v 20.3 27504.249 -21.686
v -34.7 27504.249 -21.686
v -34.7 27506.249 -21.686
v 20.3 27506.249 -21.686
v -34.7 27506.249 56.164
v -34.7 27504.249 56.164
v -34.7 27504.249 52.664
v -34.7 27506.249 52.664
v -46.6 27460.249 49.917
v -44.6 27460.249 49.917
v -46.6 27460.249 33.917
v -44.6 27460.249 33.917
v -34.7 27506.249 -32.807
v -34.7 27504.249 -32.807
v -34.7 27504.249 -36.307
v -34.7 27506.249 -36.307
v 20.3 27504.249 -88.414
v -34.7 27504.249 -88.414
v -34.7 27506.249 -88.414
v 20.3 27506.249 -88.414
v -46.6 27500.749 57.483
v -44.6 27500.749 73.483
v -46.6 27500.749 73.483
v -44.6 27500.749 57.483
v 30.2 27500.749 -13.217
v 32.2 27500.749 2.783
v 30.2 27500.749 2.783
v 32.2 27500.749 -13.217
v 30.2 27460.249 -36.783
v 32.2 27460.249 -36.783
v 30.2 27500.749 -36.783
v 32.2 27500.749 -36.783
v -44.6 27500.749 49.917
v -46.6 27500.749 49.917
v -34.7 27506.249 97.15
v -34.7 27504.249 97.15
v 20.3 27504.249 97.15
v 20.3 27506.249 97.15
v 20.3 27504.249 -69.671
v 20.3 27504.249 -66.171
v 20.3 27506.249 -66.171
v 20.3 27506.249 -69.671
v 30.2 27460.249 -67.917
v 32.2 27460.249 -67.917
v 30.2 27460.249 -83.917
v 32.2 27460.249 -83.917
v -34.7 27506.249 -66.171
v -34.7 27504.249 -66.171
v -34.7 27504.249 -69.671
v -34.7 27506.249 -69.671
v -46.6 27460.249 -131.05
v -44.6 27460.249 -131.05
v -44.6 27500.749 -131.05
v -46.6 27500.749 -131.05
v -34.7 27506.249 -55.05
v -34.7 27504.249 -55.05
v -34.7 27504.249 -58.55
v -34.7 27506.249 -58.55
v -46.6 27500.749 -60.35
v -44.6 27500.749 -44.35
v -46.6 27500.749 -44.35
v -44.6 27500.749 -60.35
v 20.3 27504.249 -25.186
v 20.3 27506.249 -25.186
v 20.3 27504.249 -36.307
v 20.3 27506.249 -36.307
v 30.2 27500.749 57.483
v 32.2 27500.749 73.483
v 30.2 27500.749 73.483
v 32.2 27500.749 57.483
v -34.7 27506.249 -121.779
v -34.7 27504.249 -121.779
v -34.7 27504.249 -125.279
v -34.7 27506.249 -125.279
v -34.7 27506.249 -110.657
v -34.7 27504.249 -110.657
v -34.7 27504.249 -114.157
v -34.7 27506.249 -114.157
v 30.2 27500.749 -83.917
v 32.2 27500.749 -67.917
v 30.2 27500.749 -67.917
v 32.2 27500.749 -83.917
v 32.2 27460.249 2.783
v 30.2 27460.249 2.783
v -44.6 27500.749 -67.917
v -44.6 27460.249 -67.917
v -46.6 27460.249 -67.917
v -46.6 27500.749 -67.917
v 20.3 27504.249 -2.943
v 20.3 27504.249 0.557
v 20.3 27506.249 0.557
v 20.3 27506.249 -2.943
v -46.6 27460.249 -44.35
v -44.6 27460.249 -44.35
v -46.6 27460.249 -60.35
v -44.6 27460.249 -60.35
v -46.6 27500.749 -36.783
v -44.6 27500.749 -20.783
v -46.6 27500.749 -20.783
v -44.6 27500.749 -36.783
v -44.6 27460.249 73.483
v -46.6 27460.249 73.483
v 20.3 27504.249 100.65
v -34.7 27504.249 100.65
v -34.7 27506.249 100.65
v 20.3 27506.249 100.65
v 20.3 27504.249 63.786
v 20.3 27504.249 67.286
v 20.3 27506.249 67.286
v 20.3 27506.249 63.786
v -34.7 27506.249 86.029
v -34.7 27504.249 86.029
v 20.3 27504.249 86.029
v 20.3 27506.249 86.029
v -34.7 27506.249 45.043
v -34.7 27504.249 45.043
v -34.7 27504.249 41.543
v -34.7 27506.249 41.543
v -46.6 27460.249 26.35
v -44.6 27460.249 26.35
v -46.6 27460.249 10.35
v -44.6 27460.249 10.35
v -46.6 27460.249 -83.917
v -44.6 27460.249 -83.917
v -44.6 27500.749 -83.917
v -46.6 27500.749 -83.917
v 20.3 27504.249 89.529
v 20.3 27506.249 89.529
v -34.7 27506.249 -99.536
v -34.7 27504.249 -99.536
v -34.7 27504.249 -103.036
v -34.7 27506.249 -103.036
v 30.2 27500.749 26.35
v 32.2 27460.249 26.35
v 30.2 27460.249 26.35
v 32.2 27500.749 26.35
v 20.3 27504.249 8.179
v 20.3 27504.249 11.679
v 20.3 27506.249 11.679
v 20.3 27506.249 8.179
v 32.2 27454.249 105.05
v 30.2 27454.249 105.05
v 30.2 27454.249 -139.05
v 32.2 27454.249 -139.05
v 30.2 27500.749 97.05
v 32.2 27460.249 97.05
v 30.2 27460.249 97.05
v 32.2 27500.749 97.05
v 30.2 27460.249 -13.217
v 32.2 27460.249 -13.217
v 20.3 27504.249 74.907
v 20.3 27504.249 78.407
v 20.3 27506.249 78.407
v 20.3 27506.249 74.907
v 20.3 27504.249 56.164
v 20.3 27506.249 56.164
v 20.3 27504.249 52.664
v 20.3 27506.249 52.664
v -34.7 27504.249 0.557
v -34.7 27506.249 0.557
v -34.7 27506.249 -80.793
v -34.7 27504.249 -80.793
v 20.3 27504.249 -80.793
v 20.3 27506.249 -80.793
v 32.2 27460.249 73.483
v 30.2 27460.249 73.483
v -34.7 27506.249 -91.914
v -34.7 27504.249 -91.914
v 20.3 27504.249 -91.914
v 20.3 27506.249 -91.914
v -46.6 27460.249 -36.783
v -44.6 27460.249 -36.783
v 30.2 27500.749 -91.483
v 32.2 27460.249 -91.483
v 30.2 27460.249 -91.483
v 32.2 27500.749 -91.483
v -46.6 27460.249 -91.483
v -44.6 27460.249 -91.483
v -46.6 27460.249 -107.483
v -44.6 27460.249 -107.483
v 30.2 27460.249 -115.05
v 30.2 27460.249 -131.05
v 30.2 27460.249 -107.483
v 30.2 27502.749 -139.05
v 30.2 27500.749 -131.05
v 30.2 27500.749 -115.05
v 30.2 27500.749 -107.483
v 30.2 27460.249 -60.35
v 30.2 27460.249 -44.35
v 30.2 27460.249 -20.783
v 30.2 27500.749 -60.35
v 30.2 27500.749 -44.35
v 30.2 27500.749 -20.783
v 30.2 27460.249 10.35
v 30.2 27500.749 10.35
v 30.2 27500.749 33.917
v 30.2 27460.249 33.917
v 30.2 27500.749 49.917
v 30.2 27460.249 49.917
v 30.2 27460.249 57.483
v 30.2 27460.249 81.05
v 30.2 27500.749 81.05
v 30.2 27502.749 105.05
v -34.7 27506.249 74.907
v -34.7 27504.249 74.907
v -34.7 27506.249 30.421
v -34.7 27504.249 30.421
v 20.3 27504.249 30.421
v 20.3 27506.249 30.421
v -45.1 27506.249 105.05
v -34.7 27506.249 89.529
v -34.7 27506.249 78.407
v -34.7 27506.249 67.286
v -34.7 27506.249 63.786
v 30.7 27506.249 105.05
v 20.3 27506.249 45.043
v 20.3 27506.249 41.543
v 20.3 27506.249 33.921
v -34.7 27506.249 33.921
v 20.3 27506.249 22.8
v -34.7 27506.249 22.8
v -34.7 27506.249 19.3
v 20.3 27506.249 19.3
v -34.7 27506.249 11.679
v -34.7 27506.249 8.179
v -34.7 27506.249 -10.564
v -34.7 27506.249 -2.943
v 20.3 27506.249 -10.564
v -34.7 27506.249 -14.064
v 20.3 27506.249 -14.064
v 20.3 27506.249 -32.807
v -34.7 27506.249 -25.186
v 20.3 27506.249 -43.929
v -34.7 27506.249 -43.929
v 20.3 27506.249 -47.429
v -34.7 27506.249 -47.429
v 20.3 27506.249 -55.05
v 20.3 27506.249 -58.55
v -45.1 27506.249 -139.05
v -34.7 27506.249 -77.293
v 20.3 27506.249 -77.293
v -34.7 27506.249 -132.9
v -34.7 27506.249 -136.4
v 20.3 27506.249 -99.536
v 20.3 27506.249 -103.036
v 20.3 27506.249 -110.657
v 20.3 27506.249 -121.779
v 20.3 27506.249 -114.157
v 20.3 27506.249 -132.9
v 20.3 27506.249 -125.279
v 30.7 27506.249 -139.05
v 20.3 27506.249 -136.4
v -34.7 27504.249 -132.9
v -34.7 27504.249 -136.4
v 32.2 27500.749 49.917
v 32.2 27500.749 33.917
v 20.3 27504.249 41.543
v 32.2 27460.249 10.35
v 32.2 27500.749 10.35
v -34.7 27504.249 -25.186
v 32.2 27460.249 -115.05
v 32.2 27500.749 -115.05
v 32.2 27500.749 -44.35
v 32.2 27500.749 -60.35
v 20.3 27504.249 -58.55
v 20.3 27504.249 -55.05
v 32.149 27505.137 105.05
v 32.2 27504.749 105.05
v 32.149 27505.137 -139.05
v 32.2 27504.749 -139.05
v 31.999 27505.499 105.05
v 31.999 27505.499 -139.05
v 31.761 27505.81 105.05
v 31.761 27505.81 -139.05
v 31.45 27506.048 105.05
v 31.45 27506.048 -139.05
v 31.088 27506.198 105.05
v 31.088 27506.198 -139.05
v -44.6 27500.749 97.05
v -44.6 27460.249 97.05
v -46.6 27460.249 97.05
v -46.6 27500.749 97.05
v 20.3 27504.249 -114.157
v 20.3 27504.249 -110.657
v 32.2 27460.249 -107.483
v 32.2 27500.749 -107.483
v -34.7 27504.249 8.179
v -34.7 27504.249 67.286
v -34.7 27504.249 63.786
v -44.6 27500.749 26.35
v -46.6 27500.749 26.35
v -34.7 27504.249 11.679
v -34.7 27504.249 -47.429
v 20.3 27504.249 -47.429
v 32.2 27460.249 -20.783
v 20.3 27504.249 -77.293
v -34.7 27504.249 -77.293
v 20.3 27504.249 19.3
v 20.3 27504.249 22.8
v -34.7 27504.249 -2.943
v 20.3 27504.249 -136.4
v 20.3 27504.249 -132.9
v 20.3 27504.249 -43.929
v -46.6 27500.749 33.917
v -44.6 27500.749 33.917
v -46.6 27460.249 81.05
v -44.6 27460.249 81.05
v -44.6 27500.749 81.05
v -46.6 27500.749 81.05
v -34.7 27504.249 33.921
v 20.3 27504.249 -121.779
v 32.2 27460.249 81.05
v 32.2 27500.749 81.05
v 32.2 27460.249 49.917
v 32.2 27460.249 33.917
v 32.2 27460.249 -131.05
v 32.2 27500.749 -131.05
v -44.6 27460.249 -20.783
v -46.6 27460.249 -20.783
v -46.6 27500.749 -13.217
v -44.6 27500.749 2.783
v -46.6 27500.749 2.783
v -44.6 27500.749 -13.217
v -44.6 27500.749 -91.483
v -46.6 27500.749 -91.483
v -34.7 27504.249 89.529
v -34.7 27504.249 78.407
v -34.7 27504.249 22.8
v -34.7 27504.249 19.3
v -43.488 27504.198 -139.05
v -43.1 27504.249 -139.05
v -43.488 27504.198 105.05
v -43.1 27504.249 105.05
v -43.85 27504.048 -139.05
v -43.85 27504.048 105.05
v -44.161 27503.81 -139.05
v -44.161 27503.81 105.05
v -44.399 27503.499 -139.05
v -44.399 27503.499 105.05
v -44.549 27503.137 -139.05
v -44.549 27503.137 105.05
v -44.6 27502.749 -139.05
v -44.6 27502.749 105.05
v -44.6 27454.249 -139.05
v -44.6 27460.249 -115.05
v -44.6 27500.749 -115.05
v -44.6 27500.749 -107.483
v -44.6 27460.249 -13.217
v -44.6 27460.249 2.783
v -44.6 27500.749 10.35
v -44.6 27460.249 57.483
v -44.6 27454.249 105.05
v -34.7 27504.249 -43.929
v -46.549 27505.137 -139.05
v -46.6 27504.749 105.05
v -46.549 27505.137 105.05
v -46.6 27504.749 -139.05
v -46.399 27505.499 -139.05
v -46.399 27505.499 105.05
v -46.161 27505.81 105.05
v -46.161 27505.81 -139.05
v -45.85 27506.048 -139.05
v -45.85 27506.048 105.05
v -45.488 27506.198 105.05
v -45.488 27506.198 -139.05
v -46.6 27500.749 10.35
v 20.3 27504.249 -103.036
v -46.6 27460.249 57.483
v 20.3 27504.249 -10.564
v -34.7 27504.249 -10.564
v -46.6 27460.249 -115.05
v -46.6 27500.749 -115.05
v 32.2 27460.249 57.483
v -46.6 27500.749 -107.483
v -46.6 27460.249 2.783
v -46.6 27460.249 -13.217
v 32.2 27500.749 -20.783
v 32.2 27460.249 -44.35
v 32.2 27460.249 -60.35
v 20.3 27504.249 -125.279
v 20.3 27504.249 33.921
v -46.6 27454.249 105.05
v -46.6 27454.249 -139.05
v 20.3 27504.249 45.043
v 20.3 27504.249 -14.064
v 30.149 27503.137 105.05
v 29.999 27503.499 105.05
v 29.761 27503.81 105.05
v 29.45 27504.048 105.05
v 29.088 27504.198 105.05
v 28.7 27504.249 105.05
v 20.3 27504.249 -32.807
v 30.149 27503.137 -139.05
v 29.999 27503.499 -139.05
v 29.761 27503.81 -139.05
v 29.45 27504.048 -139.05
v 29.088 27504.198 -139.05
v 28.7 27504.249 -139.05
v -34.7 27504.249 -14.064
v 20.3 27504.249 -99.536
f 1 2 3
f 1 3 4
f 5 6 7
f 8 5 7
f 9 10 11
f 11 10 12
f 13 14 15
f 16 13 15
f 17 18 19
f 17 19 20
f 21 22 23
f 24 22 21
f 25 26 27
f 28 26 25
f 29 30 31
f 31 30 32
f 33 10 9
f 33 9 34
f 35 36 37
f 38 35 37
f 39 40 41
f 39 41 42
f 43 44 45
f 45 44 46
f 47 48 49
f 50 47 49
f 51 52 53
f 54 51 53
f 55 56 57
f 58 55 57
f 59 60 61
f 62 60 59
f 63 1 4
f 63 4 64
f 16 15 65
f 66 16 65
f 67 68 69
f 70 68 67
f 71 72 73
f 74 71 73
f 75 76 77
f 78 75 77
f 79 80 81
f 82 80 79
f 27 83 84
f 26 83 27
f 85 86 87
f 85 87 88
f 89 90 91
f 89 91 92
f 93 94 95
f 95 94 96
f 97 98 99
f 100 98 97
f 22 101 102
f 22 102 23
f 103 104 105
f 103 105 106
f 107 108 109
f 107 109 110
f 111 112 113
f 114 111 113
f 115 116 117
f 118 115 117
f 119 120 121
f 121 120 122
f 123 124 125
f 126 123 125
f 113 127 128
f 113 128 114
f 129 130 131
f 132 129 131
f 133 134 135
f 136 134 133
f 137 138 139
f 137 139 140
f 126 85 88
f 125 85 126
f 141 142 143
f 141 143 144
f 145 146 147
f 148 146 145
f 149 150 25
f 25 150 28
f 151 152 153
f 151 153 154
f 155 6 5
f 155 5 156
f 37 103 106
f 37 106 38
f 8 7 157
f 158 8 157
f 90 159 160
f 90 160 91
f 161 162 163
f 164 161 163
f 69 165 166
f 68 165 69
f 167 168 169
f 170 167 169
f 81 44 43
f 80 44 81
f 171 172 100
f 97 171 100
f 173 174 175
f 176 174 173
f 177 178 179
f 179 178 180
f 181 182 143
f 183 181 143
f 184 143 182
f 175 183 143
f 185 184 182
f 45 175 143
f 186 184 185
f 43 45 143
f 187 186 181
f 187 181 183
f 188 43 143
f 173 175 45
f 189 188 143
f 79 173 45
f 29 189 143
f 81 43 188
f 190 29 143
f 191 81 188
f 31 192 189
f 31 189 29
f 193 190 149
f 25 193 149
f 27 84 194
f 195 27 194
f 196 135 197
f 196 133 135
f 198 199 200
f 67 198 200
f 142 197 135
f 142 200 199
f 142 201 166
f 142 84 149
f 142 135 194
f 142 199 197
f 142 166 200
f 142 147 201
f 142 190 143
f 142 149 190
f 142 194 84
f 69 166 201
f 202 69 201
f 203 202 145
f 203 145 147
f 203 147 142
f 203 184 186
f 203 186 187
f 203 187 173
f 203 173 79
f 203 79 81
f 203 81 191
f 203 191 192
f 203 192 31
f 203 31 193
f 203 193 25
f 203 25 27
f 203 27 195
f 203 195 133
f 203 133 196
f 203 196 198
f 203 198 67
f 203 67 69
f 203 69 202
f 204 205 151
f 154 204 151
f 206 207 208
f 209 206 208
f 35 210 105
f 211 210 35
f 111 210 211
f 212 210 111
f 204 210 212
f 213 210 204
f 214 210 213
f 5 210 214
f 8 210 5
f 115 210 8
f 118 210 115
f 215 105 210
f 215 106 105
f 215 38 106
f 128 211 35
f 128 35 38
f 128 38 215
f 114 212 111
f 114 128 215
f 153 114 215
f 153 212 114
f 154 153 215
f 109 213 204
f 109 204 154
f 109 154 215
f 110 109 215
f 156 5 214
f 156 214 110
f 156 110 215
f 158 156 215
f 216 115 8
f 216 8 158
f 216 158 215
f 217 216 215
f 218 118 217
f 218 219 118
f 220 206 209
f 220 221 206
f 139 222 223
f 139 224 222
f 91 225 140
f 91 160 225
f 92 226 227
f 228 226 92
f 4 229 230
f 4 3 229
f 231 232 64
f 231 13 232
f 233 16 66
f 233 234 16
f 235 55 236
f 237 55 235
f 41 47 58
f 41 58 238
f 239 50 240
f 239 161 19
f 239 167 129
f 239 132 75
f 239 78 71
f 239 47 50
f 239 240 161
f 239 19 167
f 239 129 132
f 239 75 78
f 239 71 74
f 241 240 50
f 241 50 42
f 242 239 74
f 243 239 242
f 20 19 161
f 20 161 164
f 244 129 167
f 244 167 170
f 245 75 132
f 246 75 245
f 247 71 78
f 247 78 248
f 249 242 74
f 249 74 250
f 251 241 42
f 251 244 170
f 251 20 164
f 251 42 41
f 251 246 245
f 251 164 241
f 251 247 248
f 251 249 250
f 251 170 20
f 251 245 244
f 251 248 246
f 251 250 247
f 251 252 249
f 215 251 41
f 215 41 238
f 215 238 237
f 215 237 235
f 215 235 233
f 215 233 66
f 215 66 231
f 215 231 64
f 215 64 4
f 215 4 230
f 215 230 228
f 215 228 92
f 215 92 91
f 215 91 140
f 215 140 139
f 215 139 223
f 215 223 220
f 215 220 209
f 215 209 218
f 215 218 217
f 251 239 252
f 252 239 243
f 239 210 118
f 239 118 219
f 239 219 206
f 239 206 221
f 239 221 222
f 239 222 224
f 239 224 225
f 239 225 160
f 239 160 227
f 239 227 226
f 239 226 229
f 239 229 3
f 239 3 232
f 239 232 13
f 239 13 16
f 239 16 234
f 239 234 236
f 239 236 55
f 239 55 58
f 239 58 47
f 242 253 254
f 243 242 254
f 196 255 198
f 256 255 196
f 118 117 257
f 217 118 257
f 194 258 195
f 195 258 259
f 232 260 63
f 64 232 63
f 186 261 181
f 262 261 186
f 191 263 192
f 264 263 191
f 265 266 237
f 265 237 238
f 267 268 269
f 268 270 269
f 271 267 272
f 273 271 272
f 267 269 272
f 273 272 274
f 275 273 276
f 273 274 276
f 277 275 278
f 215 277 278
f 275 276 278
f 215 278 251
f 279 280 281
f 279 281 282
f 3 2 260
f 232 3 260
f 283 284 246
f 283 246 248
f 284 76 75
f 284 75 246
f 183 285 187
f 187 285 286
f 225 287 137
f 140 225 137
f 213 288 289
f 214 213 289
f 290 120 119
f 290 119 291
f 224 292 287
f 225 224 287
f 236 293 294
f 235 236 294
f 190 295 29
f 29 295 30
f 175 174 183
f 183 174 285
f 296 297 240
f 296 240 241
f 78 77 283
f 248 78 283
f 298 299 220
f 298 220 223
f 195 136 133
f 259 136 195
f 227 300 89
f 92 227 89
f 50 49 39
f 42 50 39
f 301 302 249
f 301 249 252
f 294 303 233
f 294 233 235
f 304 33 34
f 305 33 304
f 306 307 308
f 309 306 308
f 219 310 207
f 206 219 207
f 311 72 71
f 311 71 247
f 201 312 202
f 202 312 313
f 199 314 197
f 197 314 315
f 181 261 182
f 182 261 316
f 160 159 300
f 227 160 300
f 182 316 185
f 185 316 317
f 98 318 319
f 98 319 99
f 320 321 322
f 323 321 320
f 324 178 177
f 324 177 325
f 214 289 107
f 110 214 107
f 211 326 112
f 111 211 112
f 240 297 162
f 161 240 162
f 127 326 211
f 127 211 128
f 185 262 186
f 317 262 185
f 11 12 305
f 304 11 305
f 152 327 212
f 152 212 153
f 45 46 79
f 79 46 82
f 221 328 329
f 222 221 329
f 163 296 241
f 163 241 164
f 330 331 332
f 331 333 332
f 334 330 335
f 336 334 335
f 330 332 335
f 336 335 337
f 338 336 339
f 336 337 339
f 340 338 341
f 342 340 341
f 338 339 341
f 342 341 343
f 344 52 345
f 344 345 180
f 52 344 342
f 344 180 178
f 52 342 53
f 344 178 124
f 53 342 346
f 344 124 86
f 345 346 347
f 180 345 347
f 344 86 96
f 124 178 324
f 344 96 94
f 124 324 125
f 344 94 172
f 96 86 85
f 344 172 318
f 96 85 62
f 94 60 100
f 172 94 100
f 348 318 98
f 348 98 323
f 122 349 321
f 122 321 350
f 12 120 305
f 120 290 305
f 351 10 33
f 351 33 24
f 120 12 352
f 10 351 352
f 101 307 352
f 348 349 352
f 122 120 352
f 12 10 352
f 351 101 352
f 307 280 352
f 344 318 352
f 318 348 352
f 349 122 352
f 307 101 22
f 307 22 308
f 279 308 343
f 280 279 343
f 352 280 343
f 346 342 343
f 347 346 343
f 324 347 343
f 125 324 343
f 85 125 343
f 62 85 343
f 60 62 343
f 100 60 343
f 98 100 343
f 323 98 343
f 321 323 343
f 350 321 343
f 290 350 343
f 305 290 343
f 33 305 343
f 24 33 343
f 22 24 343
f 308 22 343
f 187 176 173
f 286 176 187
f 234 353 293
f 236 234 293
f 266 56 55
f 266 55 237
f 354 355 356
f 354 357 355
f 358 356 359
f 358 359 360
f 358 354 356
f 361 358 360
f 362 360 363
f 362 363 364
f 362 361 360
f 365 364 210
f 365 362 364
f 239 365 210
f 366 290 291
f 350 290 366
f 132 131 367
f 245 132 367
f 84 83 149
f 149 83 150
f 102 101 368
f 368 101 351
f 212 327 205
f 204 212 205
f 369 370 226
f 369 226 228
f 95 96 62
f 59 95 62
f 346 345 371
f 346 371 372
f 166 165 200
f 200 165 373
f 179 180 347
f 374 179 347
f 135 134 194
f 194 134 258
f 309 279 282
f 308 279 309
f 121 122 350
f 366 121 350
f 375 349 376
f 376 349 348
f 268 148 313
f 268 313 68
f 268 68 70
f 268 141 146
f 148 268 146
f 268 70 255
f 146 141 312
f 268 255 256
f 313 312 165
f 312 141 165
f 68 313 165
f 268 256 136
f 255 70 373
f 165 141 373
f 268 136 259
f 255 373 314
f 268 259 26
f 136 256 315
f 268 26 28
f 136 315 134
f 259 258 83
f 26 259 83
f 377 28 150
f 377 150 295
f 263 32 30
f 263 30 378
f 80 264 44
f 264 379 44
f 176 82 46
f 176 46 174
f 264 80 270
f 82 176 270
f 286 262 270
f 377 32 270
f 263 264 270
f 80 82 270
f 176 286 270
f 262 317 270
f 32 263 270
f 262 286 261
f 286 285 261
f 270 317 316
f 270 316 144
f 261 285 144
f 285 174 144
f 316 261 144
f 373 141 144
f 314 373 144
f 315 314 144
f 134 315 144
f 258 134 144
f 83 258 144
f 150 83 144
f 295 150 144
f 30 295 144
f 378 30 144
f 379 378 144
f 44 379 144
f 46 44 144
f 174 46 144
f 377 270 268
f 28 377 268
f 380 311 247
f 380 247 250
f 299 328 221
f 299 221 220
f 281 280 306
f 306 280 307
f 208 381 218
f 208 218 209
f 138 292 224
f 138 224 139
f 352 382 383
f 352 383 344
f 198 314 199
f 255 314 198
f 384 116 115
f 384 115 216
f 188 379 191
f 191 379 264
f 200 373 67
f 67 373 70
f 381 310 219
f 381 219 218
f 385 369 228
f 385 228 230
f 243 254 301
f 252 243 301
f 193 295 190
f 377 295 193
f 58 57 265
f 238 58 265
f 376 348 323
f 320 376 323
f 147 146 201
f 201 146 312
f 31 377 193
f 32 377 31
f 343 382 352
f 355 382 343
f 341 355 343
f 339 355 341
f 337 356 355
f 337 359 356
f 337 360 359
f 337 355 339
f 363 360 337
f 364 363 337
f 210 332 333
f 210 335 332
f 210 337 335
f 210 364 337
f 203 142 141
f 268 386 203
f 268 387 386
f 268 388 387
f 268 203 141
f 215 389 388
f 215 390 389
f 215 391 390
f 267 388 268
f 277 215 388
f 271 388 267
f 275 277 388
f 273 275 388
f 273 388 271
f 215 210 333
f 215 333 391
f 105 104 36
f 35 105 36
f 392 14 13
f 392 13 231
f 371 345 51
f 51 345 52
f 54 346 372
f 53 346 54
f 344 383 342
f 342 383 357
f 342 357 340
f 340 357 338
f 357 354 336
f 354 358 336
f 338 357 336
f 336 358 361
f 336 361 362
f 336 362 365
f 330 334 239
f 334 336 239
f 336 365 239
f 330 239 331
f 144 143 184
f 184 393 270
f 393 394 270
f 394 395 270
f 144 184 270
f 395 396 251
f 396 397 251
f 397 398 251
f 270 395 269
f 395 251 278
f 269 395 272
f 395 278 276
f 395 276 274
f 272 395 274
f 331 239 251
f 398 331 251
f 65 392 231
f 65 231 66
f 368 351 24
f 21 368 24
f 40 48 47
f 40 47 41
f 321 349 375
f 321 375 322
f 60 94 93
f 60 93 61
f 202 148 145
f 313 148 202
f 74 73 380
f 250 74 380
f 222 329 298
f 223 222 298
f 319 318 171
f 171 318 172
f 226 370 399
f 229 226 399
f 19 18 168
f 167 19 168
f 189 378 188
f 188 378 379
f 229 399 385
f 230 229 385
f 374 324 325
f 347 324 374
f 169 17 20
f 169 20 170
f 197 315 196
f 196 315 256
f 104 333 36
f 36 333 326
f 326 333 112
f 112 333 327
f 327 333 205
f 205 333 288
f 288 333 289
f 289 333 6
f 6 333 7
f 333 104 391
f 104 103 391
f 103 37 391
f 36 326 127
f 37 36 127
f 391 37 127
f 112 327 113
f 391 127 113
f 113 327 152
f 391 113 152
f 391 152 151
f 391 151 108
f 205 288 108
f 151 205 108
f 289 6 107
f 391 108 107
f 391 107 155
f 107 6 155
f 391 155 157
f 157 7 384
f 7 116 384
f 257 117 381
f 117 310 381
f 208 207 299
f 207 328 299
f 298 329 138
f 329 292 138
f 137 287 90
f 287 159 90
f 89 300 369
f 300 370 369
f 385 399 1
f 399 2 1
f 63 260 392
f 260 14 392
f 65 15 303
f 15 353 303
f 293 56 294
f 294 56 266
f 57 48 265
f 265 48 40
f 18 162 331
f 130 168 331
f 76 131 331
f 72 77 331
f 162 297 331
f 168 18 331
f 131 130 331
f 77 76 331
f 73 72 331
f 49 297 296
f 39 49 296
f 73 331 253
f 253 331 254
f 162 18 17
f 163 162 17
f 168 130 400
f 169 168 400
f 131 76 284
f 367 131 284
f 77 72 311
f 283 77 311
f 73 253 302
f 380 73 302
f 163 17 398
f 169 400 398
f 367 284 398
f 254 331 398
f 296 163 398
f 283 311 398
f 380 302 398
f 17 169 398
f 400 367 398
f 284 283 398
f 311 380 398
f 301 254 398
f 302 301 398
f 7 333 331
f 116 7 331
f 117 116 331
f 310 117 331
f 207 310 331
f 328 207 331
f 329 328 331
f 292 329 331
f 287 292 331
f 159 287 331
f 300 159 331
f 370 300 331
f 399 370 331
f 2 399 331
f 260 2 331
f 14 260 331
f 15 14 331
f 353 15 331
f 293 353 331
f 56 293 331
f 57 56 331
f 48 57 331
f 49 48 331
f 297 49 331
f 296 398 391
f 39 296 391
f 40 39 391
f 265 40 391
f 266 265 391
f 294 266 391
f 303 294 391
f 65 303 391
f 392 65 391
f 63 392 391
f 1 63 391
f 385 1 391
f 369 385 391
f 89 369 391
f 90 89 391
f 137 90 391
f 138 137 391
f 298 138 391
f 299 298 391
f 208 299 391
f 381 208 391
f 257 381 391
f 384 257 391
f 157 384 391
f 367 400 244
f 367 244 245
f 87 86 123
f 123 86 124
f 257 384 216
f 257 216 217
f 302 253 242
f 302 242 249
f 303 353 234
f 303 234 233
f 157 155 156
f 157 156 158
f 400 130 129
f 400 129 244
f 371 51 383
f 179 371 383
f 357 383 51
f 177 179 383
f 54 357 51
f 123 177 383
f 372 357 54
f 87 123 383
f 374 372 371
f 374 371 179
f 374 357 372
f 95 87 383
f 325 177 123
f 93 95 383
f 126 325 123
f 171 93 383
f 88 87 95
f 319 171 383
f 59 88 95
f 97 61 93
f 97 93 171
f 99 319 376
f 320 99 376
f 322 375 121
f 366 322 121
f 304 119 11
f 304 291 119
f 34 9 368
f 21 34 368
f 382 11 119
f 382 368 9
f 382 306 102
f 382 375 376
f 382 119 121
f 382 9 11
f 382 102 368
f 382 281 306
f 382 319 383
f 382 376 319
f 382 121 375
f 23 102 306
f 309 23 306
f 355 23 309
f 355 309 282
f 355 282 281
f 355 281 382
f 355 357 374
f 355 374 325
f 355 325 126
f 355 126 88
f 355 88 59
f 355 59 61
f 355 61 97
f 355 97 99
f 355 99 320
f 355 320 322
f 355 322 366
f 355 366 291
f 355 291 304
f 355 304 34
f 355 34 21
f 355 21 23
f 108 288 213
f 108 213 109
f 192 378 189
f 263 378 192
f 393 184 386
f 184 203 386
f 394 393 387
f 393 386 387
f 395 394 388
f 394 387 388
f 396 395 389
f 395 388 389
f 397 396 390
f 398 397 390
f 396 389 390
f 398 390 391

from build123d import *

# Parameters (mm, degrees)
SKETCH2_W           = 78.8
SKETCH2_H           = 244.1
SKETCH2_W_2         = 55
SKETCH2_H_2         = 3.5
BOSS_EXTRUDE1_DEPTH = 2
SKETCH3_W           = 2
SKETCH3_H           = 244.1
BOSS_EXTRUDE2_DEPTH = 50
FILLET1_R           = 1.5
SKETCH4_W           = 16
SKETCH4_H           = 40.5
CUT_EXTRUDE1_DEPTH  = 27507.713596192


with BuildPart() as part:
    # Sketch2 → Boss-Extrude1 (new body)
    with BuildSketch(Plane(origin=(0, 27504.249263039, 0), x_dir=(1, 0, 0), z_dir=(0, 1, 0))):
        with Locations((-7.2, 17)):
            Rectangle(SKETCH2_W, SKETCH2_H)
        with Locations((-7.2, 123.528571429)):
            Rectangle(SKETCH2_W_2, SKETCH2_H_2, mode=Mode.SUBTRACT)
        with Locations((-7.2, 134.65)):
            Rectangle(SKETCH2_W_2, SKETCH2_H_2, mode=Mode.SUBTRACT)
        with Locations((-7.2, 112.407142857)):
            Rectangle(SKETCH2_W_2, SKETCH2_H_2, mode=Mode.SUBTRACT)
        with Locations((-7.2, 101.285714286)):
            Rectangle(SKETCH2_W_2, SKETCH2_H_2, mode=Mode.SUBTRACT)
        with Locations((-7.2, 90.164285714)):
            Rectangle(SKETCH2_W_2, SKETCH2_H_2, mode=Mode.SUBTRACT)
        with Locations((-7.2, 79.042857143)):
            Rectangle(SKETCH2_W_2, SKETCH2_H_2, mode=Mode.SUBTRACT)
        with Locations((-7.2, 67.921428571)):
            Rectangle(SKETCH2_W_2, SKETCH2_H_2, mode=Mode.SUBTRACT)
        with Locations((-7.2, 56.8)):
            Rectangle(SKETCH2_W_2, SKETCH2_H_2, mode=Mode.SUBTRACT)
        with Locations((-7.2, 45.678571429)):
            Rectangle(SKETCH2_W_2, SKETCH2_H_2, mode=Mode.SUBTRACT)
        with Locations((-7.2, 34.557142857)):
            Rectangle(SKETCH2_W_2, SKETCH2_H_2, mode=Mode.SUBTRACT)
        with Locations((-7.2, 23.435714286)):
            Rectangle(SKETCH2_W_2, SKETCH2_H_2, mode=Mode.SUBTRACT)
        with Locations((-7.2, 12.314285714)):
            Rectangle(SKETCH2_W_2, SKETCH2_H_2, mode=Mode.SUBTRACT)
        with Locations((-7.2, 1.192857143)):
            Rectangle(SKETCH2_W_2, SKETCH2_H_2, mode=Mode.SUBTRACT)
        with Locations((-7.2, -9.928571429)):
            Rectangle(SKETCH2_W_2, SKETCH2_H_2, mode=Mode.SUBTRACT)
        with Locations((-7.2, -21.05)):
            Rectangle(SKETCH2_W_2, SKETCH2_H_2, mode=Mode.SUBTRACT)
        with Locations((-7.2, -32.171428571)):
            Rectangle(SKETCH2_W_2, SKETCH2_H_2, mode=Mode.SUBTRACT)
        with Locations((-7.2, -43.292857143)):
            Rectangle(SKETCH2_W_2, SKETCH2_H_2, mode=Mode.SUBTRACT)
        with Locations((-7.2, -54.414285714)):
            Rectangle(SKETCH2_W_2, SKETCH2_H_2, mode=Mode.SUBTRACT)
        with Locations((-7.2, -65.535714286)):
            Rectangle(SKETCH2_W_2, SKETCH2_H_2, mode=Mode.SUBTRACT)
        with Locations((-7.2, -76.657142857)):
            Rectangle(SKETCH2_W_2, SKETCH2_H_2, mode=Mode.SUBTRACT)
        with Locations((-7.2, -87.778571429)):
            Rectangle(SKETCH2_W_2, SKETCH2_H_2, mode=Mode.SUBTRACT)
        with Locations((-7.2, -98.9)):
            Rectangle(SKETCH2_W_2, SKETCH2_H_2, mode=Mode.SUBTRACT)
    extrude(amount=BOSS_EXTRUDE1_DEPTH)

    # Sketch3 → Boss-Extrude2 (add)
    with BuildSketch(Plane.XZ.offset(-27504.249263039)):
        with Locations((-45.6, -17)):
            Rectangle(SKETCH3_W, SKETCH3_H)
        with Locations((31.2, -17)):
            Rectangle(SKETCH3_W, SKETCH3_H)
    extrude(amount=BOSS_EXTRUDE2_DEPTH)

    # Fillet1
    fillet1_edges = [part.edges().sort_by_distance(p)[0] for p in [
        (32.2, 27506.249263039, -17),
        (-44.6, 27504.249263039, -17),
        (30.2, 27504.249263039, -17),
        (-46.6, 27506.249263039, -17),
    ]]
    fillet(fillet1_edges, radius=FILLET1_R)

    # Sketch4 → Cut-Extrude1 (cut, through all)
    with BuildSketch(Plane(origin=(32.2, 0, 0), x_dir=(0, 0, -1), z_dir=(1, 0, 0))):
        with Locations((-89.05, 27480.499263039)):
            Rectangle(SKETCH4_W, SKETCH4_H)
        with Locations((-65.483333333, 27480.499263039)):
            Rectangle(SKETCH4_W, SKETCH4_H)
        with Locations((-41.916666667, 27480.499263039)):
            Rectangle(SKETCH4_W, SKETCH4_H)
        with Locations((-18.35, 27480.499263039)):
            Rectangle(SKETCH4_W, SKETCH4_H)
        with Locations((5.216666667, 27480.499263039)):
            Rectangle(SKETCH4_W, SKETCH4_H)
        with Locations((28.783333333, 27480.499263039)):
            Rectangle(SKETCH4_W, SKETCH4_H)
        with Locations((52.35, 27480.499263039)):
            Rectangle(SKETCH4_W, SKETCH4_H)
        with Locations((75.916666667, 27480.499263039)):
            Rectangle(SKETCH4_W, SKETCH4_H)
        with Locations((99.483333333, 27480.499263039)):
            Rectangle(SKETCH4_W, SKETCH4_H)
        with Locations((123.05, 27480.499263039)):
            Rectangle(SKETCH4_W, SKETCH4_H)
    extrude(amount=-CUT_EXTRUDE1_DEPTH, mode=Mode.SUBTRACT)


solid = part.part
